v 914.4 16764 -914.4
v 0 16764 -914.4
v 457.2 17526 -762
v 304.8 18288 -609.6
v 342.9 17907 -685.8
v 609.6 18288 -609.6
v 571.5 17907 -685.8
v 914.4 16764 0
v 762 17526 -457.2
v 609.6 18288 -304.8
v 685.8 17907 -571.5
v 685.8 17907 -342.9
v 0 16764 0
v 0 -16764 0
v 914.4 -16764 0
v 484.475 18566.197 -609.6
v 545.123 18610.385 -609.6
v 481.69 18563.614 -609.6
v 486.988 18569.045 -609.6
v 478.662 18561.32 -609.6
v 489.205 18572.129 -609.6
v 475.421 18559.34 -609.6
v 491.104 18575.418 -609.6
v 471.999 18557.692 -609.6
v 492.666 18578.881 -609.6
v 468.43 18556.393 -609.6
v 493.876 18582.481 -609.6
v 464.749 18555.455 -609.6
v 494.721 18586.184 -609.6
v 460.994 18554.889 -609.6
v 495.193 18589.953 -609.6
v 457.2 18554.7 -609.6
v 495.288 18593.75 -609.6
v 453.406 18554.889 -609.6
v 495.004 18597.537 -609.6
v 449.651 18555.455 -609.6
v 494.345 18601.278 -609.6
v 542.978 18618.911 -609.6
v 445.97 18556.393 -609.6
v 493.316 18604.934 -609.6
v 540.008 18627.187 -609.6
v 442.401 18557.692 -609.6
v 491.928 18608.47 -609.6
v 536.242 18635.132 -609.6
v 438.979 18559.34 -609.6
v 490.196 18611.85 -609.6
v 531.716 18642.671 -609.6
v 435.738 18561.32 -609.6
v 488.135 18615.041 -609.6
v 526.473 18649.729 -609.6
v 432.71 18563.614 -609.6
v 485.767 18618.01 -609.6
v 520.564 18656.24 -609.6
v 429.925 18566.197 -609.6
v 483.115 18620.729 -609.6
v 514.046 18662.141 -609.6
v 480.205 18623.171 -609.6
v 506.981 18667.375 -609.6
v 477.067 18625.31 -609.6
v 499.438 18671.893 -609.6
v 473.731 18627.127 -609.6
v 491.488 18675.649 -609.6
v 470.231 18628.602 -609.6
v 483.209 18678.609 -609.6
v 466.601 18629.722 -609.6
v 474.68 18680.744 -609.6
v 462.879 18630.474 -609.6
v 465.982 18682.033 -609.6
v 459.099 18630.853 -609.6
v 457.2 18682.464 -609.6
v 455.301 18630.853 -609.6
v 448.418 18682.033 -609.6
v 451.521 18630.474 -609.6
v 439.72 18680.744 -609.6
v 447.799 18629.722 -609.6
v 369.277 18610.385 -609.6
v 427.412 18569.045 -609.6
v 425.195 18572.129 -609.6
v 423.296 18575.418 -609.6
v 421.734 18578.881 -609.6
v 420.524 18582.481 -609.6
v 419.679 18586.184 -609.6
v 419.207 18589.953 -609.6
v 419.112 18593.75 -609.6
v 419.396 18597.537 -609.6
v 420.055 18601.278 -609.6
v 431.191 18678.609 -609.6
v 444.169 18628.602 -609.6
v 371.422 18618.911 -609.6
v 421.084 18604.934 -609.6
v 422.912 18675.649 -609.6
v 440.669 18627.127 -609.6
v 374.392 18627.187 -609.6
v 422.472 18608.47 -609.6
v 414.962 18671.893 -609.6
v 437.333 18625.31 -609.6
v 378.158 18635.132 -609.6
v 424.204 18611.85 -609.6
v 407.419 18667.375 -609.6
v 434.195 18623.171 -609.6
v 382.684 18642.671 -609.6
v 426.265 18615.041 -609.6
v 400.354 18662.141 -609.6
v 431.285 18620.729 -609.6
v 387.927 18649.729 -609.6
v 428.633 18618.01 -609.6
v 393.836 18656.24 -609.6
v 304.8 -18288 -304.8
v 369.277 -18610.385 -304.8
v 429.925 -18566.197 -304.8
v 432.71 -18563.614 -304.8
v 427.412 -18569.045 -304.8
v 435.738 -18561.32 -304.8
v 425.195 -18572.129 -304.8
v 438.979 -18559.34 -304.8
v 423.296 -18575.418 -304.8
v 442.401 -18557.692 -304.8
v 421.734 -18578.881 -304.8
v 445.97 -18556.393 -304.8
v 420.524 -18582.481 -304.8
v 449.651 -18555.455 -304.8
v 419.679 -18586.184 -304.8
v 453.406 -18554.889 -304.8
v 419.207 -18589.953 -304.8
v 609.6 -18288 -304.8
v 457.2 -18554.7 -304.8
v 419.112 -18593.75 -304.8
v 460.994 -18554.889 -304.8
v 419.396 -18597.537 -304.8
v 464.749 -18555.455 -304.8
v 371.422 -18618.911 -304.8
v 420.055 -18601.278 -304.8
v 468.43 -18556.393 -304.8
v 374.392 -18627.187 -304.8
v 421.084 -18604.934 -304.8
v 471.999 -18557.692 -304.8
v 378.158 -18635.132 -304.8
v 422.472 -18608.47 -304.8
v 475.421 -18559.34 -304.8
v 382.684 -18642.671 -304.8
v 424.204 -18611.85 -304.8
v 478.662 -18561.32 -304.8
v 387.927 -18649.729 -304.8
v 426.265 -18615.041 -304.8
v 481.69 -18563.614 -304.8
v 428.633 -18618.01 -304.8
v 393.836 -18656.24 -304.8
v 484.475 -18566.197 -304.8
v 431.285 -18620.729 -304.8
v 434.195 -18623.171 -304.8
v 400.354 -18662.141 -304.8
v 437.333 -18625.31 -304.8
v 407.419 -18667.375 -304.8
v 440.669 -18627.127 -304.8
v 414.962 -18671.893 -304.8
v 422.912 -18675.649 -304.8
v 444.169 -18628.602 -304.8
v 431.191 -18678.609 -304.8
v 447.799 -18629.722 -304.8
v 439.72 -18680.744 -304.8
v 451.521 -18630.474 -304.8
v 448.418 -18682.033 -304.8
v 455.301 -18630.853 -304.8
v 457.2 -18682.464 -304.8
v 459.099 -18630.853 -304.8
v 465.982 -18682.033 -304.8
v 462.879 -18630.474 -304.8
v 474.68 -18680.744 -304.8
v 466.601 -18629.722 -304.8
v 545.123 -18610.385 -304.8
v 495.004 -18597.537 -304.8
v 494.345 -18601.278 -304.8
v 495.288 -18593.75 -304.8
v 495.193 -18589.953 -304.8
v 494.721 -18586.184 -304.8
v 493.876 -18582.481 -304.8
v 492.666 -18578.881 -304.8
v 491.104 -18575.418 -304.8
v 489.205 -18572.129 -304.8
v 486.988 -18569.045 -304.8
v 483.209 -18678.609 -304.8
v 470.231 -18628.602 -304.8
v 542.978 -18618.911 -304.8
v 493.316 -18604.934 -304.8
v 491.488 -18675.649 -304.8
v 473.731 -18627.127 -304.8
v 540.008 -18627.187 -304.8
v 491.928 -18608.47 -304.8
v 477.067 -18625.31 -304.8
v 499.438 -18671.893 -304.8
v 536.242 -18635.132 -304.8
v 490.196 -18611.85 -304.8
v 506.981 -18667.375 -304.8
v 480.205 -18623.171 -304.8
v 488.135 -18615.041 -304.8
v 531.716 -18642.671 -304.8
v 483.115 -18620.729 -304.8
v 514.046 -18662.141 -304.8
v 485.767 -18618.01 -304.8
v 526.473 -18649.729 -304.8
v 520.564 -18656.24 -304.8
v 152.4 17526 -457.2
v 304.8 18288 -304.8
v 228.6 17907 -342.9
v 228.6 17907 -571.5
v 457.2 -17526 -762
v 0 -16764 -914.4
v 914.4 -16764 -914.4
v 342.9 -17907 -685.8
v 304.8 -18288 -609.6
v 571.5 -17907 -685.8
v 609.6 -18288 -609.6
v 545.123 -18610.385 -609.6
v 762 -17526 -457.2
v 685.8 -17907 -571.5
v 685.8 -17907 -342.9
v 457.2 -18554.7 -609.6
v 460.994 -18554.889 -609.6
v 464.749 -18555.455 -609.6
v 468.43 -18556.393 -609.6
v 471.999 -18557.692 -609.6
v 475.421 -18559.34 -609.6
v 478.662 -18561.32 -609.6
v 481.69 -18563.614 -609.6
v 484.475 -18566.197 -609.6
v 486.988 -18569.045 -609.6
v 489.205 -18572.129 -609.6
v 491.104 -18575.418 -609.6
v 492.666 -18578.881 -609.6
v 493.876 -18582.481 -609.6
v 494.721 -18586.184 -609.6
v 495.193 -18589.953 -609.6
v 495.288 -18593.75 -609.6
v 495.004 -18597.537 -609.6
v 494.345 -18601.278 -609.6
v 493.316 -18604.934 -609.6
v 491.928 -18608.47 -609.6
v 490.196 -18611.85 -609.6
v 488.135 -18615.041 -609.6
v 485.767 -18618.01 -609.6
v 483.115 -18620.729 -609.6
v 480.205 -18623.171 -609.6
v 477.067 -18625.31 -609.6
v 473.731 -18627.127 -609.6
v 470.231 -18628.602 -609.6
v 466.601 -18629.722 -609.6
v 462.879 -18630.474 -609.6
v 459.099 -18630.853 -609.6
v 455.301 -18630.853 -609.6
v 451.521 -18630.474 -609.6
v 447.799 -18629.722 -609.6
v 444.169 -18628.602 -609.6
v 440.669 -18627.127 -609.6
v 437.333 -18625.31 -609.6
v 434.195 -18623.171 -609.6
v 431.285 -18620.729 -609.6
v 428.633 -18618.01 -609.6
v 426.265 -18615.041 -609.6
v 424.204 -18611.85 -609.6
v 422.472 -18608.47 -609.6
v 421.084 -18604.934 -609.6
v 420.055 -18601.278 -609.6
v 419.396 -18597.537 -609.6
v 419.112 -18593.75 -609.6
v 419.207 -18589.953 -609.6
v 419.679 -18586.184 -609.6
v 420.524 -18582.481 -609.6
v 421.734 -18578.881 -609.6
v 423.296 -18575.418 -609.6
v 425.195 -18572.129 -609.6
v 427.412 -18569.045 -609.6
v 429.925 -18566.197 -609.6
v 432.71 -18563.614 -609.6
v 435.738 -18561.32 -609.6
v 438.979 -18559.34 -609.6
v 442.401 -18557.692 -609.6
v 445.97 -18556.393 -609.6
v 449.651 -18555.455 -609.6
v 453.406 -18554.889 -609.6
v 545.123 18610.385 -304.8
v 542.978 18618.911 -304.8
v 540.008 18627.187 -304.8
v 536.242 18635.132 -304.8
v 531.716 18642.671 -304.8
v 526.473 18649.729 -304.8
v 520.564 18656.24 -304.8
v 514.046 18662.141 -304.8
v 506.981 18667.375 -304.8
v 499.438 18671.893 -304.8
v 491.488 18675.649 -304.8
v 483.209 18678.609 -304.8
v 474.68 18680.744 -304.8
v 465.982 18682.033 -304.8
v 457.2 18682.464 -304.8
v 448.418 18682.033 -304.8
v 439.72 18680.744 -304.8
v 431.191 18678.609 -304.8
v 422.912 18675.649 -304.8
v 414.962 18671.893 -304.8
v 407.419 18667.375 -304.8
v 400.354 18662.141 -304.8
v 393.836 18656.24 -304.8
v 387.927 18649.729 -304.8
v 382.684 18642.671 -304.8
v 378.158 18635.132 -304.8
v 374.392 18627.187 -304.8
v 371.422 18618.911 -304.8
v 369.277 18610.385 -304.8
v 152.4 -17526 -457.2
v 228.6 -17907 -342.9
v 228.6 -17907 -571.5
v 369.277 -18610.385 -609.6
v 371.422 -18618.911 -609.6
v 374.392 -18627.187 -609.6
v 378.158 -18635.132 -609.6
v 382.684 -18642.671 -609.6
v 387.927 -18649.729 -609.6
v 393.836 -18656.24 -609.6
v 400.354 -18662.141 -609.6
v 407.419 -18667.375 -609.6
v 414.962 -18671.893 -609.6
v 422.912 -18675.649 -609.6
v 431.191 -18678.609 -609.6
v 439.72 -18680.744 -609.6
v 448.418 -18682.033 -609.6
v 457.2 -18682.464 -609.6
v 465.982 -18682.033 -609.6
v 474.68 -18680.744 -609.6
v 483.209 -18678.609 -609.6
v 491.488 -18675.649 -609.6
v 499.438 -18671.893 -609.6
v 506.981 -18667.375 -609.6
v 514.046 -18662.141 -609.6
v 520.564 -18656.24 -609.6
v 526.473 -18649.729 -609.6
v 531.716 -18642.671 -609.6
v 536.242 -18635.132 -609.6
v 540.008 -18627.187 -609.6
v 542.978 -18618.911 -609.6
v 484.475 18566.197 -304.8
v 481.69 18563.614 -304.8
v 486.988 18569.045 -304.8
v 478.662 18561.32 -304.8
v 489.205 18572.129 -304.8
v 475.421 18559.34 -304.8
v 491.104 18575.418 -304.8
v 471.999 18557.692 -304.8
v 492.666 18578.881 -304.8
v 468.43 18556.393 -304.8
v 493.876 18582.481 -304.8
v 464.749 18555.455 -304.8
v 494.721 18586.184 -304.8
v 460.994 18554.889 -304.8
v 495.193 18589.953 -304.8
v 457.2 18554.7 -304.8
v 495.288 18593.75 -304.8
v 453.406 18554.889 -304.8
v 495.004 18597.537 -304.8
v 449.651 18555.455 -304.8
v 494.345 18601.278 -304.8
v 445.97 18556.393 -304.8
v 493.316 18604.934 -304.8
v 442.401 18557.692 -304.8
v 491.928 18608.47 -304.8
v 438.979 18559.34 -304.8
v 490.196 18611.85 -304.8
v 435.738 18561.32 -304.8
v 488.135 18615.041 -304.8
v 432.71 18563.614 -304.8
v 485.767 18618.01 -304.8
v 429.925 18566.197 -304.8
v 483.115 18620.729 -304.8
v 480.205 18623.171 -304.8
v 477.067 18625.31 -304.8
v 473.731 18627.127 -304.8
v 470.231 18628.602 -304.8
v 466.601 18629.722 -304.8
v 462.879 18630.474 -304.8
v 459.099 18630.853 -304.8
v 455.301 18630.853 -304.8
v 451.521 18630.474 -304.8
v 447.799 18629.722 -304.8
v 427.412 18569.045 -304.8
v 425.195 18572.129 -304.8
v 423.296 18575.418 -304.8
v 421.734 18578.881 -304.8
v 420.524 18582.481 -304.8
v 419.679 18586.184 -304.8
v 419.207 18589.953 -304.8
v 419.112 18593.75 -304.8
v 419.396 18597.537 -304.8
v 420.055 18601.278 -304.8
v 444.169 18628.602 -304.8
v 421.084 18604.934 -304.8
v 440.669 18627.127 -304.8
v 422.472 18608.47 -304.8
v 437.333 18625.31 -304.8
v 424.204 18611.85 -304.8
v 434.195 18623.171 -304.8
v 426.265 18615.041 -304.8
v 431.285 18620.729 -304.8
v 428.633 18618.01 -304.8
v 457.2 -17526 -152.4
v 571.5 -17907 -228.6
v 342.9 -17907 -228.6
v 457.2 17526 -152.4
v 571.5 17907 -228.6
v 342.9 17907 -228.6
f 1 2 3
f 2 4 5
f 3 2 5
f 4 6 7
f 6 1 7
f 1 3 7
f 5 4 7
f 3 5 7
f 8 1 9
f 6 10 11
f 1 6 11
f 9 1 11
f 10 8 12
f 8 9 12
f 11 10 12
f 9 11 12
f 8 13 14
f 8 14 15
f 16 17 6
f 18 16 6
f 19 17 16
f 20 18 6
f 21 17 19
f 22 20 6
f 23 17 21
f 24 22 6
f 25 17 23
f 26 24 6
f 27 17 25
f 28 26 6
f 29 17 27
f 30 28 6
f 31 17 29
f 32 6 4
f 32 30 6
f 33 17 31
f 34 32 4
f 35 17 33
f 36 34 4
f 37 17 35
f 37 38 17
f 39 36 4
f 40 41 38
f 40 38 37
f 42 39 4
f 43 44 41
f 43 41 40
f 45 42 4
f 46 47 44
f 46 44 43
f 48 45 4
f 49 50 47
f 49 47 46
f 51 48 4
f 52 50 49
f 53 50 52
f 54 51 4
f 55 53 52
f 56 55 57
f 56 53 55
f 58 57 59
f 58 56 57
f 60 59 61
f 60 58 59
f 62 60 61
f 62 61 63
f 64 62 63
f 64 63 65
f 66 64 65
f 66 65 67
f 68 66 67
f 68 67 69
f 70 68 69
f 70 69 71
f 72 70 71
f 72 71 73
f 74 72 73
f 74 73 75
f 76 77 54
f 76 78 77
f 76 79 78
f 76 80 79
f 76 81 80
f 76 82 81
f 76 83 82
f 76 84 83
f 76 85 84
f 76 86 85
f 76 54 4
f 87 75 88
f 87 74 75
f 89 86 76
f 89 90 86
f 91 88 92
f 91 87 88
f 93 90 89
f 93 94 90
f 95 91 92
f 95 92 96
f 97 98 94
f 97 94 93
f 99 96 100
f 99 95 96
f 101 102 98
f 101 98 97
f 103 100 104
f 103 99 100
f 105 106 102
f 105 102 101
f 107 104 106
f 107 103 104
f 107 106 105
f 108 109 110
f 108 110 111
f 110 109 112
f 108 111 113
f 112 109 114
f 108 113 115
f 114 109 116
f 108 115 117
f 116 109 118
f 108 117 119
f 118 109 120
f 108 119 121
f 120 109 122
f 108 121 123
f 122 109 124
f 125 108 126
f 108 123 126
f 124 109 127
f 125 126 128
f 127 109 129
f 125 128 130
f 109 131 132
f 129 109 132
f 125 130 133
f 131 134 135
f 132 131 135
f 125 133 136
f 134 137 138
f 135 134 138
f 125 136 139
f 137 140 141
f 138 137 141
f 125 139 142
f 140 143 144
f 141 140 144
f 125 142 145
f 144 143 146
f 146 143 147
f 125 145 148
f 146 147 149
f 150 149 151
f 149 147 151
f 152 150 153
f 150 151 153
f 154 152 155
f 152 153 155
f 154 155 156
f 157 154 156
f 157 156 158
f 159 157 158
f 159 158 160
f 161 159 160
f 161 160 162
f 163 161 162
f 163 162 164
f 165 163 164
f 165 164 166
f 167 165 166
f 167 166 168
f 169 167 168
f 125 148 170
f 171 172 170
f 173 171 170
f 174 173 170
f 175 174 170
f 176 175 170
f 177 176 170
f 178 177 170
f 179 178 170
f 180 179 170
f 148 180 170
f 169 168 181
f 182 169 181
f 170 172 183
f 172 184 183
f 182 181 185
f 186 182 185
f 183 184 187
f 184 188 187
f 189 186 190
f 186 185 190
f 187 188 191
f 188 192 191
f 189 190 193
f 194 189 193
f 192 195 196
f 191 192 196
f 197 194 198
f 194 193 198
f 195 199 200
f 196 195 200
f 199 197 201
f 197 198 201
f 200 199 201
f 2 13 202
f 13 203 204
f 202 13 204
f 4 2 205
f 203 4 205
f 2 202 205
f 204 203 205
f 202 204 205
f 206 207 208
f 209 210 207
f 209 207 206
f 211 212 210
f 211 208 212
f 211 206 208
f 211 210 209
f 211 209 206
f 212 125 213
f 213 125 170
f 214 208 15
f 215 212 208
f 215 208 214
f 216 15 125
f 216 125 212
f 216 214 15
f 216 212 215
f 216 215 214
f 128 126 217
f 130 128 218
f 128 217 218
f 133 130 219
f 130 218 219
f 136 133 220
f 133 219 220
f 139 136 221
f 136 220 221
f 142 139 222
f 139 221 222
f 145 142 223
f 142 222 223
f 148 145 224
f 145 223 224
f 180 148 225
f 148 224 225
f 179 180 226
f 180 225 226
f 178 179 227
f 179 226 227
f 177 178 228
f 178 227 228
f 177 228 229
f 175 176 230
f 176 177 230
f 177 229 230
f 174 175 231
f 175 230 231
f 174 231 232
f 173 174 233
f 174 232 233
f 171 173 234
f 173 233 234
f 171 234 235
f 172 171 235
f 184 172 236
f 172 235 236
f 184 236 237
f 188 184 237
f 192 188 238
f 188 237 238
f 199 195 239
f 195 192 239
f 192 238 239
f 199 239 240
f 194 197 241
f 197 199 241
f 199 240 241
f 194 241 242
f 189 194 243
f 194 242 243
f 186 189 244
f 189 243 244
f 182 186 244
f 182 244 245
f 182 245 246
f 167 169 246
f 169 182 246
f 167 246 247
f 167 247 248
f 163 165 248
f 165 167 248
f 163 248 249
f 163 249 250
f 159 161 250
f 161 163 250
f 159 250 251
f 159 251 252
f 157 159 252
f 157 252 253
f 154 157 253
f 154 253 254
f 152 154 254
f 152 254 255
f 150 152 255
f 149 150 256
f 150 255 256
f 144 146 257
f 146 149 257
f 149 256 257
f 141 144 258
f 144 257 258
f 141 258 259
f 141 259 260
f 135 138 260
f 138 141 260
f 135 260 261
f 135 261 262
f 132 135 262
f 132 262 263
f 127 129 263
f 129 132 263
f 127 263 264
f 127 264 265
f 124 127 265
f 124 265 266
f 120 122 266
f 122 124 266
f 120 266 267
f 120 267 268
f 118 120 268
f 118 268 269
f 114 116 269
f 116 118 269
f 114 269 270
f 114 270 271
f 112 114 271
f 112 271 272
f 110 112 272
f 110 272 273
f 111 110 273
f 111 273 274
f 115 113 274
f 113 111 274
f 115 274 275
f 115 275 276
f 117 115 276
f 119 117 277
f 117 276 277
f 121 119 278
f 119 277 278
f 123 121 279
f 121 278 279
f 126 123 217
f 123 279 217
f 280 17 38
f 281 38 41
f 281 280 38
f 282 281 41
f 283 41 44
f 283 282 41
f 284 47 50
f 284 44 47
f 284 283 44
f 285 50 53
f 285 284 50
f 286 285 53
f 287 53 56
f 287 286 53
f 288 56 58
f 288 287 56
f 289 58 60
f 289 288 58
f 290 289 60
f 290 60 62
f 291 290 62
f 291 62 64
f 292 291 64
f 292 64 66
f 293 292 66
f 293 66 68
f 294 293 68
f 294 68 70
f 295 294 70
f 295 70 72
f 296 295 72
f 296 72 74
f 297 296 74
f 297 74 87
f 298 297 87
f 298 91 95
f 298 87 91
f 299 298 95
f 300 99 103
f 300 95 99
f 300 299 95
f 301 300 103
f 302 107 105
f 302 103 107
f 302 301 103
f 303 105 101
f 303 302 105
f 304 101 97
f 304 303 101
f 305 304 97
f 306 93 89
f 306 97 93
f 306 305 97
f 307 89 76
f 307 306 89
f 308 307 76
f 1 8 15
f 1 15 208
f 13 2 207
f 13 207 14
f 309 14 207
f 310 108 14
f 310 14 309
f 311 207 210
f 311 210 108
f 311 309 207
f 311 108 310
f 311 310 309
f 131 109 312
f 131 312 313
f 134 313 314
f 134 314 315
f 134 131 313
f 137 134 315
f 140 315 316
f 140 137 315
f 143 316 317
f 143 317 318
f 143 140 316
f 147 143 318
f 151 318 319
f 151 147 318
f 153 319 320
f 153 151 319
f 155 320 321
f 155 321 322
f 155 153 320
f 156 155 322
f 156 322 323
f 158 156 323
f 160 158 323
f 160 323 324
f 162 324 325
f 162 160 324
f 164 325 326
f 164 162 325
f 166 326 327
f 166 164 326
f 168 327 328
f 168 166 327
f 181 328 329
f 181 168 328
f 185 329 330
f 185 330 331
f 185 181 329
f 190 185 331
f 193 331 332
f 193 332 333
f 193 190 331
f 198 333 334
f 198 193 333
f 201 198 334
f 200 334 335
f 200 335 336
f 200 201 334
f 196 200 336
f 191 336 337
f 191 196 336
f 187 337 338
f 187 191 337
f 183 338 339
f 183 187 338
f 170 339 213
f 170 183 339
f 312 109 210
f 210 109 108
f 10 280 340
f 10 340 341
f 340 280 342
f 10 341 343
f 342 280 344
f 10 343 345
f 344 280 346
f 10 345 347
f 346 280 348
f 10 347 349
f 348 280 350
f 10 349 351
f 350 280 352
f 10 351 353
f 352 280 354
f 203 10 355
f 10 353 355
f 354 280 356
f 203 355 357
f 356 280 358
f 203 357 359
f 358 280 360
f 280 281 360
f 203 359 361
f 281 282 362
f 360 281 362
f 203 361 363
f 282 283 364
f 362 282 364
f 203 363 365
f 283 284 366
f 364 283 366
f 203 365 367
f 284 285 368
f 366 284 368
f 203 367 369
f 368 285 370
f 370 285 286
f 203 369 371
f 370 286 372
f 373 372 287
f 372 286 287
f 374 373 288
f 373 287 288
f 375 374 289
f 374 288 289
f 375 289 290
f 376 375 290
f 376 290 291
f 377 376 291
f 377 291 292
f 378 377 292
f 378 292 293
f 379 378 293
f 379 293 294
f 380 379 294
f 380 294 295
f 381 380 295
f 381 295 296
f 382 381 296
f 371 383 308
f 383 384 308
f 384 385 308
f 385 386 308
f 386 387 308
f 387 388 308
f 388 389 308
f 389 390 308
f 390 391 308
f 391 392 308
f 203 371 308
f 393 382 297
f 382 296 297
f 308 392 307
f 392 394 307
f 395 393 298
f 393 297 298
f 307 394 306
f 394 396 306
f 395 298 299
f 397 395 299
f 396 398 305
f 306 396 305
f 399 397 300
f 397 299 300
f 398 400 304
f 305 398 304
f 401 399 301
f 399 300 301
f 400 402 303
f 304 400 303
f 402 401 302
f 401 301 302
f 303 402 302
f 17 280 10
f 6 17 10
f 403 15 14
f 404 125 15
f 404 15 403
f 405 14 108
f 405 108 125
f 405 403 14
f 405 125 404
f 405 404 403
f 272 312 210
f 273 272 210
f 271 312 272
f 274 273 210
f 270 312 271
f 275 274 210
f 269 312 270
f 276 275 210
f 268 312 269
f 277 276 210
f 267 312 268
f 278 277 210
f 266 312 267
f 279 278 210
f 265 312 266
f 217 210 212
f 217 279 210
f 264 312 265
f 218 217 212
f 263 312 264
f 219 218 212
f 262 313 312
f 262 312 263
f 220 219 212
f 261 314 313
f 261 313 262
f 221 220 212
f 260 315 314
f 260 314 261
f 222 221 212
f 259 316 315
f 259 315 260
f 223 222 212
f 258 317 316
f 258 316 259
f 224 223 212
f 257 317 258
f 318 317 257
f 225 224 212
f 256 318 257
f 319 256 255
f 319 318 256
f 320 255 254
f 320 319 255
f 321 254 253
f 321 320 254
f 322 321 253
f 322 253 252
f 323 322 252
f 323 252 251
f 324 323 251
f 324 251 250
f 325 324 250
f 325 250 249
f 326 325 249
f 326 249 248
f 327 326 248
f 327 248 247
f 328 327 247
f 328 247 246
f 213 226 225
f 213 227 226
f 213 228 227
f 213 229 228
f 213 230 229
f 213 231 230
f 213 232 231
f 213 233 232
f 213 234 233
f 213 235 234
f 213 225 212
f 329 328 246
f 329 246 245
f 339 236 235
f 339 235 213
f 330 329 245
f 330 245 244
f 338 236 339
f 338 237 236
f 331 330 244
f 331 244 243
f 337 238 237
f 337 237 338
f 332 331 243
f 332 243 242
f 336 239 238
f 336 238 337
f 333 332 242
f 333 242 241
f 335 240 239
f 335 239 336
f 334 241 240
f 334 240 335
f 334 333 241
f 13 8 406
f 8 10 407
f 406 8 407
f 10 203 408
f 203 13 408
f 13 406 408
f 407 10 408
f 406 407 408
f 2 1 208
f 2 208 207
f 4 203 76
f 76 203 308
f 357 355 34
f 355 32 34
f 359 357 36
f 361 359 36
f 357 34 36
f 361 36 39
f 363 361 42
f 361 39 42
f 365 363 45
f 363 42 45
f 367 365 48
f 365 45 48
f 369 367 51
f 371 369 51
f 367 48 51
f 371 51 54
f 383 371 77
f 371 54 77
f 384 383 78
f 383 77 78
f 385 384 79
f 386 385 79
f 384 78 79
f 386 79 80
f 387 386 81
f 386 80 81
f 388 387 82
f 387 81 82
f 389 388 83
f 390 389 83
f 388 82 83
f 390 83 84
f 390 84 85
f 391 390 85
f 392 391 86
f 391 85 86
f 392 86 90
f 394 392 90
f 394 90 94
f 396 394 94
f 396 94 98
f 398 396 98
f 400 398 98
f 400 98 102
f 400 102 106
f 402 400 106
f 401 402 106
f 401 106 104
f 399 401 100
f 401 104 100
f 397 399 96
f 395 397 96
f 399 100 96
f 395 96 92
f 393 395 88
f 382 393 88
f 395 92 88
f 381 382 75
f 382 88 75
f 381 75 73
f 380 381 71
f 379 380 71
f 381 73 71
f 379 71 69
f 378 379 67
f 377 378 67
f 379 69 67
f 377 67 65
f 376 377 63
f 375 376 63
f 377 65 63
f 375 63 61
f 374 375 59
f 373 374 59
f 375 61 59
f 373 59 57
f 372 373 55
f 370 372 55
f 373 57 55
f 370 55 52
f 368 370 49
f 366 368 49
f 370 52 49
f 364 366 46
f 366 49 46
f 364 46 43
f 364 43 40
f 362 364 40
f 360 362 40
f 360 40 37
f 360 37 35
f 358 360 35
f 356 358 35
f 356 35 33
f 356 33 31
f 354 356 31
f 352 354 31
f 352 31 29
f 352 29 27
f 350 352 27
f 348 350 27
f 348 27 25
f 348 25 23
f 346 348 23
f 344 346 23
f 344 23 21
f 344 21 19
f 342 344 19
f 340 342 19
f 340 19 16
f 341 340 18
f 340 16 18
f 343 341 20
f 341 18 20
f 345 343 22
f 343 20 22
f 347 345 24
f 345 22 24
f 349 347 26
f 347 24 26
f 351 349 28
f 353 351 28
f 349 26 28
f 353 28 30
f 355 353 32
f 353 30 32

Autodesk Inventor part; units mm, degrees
ref_plane "YZ Plane" through (0, 0, 0) normal (1, 0, 0) x (0, 1, 0)
sketch "Sketch5" plane through (0, 0, 0) normal (0, 1, 0) x (-1, 0, 0)
  line L0 (0, 0) -> (-914.4, 0)
  line L1 (-914.4, 0) -> (-914.4, -914.4)
  line L2 (-914.4, -914.4) -> (0, -914.4)
  line L3 (0, -914.4) -> (0, 0)
  dimension "d26" = 914.4
  dimension "d27" = 914.4
extrude "Extrusion3" add sketch "Sketch5" along normal mid plane 33528
ref_plane "Work Plane4" through (0, 18288, 0) normal (0, 1, 0) x (1, 0, 0)
sketch "Sketch6" plane through (0, 18288, 0) normal (0, 1, 0) x (1, 0, 0)
  line L0 (609.6, 304.8) -> (304.8, 304.8)
  line L1 (304.8, 304.8) -> (304.8, 609.6)
  line L2 (304.8, 609.6) -> (609.6, 609.6)
  line L3 (609.6, 609.6) -> (609.6, 304.8)
  line L4 (914.4, 914.4) -> (0, 914.4) projected
  line L5 (914.4, 0) -> (914.4, 914.4) projected
  point P0 (0, 0)
  dimension "d31" = 304.8
  dimension "d32" = 304.8
  dimension "d33" = 304.8
  dimension "d34" = 304.8
loft "Loft3" add profiles "Sketch6" section 1 edges at (457.2, 16764, 0) (914.4, 16764, -457.2) (457.2, 16764, -914.4) (0, 16764, -457.2)
ref_plane "Work Plane5" through (609.6, 18288, -304.8) normal (0, 0, -1) x (-1, 0, 0)
sketch "Sketch7" plane through (609.6, 18288, -304.8) normal (0, 0, -1) x (-1, 0, 0)
  line L0 (609.6, -1524) -> (304.8, 0) projected
  line L1 (0, 0) -> (304.8, 0) projected
  line L2 (-304.8, -1524) -> (0, 0) projected
  line L3 (304.8, 0) -> (0, 0) projected
  line L4 (304.8, 0) -> (240.3231, 322.3846)
  arc A0 (240.3231, 322.3846) -> (64.4769, 322.3846) centre (152.4, 304.8) ccw
  line L5 (-304.8, -1524) -> (0, 0) projected
  line L6 (64.4769, 322.3846) -> (0, 0)
  point P0 (609.6, -18288)
  dimension "d40" = 304.8
extrude "Extrusion4" add sketch "Sketch7" along normal up to surface (304.8 mm away)
hole "Hole1" at (457.2, 18592.8, -304.8) direction (0, 0, -1) diameter 76.2 end through all
mirror "Mirror1" about plane through (0, 0, 0) normal (0, 1, 0) of "Loft3", "Extrusion4", "Hole1"
ref_plane "Work Plane6" through (0, -18288, 0) normal (0, 1, 0) x (1, 0, 0)
ref_plane "Work Plane7" through (609.6, -18288, -304.8) normal (0, 0, 1) x (-1, 0, 0)
properties part number "MM Support A" material "Iron, Malleable"
